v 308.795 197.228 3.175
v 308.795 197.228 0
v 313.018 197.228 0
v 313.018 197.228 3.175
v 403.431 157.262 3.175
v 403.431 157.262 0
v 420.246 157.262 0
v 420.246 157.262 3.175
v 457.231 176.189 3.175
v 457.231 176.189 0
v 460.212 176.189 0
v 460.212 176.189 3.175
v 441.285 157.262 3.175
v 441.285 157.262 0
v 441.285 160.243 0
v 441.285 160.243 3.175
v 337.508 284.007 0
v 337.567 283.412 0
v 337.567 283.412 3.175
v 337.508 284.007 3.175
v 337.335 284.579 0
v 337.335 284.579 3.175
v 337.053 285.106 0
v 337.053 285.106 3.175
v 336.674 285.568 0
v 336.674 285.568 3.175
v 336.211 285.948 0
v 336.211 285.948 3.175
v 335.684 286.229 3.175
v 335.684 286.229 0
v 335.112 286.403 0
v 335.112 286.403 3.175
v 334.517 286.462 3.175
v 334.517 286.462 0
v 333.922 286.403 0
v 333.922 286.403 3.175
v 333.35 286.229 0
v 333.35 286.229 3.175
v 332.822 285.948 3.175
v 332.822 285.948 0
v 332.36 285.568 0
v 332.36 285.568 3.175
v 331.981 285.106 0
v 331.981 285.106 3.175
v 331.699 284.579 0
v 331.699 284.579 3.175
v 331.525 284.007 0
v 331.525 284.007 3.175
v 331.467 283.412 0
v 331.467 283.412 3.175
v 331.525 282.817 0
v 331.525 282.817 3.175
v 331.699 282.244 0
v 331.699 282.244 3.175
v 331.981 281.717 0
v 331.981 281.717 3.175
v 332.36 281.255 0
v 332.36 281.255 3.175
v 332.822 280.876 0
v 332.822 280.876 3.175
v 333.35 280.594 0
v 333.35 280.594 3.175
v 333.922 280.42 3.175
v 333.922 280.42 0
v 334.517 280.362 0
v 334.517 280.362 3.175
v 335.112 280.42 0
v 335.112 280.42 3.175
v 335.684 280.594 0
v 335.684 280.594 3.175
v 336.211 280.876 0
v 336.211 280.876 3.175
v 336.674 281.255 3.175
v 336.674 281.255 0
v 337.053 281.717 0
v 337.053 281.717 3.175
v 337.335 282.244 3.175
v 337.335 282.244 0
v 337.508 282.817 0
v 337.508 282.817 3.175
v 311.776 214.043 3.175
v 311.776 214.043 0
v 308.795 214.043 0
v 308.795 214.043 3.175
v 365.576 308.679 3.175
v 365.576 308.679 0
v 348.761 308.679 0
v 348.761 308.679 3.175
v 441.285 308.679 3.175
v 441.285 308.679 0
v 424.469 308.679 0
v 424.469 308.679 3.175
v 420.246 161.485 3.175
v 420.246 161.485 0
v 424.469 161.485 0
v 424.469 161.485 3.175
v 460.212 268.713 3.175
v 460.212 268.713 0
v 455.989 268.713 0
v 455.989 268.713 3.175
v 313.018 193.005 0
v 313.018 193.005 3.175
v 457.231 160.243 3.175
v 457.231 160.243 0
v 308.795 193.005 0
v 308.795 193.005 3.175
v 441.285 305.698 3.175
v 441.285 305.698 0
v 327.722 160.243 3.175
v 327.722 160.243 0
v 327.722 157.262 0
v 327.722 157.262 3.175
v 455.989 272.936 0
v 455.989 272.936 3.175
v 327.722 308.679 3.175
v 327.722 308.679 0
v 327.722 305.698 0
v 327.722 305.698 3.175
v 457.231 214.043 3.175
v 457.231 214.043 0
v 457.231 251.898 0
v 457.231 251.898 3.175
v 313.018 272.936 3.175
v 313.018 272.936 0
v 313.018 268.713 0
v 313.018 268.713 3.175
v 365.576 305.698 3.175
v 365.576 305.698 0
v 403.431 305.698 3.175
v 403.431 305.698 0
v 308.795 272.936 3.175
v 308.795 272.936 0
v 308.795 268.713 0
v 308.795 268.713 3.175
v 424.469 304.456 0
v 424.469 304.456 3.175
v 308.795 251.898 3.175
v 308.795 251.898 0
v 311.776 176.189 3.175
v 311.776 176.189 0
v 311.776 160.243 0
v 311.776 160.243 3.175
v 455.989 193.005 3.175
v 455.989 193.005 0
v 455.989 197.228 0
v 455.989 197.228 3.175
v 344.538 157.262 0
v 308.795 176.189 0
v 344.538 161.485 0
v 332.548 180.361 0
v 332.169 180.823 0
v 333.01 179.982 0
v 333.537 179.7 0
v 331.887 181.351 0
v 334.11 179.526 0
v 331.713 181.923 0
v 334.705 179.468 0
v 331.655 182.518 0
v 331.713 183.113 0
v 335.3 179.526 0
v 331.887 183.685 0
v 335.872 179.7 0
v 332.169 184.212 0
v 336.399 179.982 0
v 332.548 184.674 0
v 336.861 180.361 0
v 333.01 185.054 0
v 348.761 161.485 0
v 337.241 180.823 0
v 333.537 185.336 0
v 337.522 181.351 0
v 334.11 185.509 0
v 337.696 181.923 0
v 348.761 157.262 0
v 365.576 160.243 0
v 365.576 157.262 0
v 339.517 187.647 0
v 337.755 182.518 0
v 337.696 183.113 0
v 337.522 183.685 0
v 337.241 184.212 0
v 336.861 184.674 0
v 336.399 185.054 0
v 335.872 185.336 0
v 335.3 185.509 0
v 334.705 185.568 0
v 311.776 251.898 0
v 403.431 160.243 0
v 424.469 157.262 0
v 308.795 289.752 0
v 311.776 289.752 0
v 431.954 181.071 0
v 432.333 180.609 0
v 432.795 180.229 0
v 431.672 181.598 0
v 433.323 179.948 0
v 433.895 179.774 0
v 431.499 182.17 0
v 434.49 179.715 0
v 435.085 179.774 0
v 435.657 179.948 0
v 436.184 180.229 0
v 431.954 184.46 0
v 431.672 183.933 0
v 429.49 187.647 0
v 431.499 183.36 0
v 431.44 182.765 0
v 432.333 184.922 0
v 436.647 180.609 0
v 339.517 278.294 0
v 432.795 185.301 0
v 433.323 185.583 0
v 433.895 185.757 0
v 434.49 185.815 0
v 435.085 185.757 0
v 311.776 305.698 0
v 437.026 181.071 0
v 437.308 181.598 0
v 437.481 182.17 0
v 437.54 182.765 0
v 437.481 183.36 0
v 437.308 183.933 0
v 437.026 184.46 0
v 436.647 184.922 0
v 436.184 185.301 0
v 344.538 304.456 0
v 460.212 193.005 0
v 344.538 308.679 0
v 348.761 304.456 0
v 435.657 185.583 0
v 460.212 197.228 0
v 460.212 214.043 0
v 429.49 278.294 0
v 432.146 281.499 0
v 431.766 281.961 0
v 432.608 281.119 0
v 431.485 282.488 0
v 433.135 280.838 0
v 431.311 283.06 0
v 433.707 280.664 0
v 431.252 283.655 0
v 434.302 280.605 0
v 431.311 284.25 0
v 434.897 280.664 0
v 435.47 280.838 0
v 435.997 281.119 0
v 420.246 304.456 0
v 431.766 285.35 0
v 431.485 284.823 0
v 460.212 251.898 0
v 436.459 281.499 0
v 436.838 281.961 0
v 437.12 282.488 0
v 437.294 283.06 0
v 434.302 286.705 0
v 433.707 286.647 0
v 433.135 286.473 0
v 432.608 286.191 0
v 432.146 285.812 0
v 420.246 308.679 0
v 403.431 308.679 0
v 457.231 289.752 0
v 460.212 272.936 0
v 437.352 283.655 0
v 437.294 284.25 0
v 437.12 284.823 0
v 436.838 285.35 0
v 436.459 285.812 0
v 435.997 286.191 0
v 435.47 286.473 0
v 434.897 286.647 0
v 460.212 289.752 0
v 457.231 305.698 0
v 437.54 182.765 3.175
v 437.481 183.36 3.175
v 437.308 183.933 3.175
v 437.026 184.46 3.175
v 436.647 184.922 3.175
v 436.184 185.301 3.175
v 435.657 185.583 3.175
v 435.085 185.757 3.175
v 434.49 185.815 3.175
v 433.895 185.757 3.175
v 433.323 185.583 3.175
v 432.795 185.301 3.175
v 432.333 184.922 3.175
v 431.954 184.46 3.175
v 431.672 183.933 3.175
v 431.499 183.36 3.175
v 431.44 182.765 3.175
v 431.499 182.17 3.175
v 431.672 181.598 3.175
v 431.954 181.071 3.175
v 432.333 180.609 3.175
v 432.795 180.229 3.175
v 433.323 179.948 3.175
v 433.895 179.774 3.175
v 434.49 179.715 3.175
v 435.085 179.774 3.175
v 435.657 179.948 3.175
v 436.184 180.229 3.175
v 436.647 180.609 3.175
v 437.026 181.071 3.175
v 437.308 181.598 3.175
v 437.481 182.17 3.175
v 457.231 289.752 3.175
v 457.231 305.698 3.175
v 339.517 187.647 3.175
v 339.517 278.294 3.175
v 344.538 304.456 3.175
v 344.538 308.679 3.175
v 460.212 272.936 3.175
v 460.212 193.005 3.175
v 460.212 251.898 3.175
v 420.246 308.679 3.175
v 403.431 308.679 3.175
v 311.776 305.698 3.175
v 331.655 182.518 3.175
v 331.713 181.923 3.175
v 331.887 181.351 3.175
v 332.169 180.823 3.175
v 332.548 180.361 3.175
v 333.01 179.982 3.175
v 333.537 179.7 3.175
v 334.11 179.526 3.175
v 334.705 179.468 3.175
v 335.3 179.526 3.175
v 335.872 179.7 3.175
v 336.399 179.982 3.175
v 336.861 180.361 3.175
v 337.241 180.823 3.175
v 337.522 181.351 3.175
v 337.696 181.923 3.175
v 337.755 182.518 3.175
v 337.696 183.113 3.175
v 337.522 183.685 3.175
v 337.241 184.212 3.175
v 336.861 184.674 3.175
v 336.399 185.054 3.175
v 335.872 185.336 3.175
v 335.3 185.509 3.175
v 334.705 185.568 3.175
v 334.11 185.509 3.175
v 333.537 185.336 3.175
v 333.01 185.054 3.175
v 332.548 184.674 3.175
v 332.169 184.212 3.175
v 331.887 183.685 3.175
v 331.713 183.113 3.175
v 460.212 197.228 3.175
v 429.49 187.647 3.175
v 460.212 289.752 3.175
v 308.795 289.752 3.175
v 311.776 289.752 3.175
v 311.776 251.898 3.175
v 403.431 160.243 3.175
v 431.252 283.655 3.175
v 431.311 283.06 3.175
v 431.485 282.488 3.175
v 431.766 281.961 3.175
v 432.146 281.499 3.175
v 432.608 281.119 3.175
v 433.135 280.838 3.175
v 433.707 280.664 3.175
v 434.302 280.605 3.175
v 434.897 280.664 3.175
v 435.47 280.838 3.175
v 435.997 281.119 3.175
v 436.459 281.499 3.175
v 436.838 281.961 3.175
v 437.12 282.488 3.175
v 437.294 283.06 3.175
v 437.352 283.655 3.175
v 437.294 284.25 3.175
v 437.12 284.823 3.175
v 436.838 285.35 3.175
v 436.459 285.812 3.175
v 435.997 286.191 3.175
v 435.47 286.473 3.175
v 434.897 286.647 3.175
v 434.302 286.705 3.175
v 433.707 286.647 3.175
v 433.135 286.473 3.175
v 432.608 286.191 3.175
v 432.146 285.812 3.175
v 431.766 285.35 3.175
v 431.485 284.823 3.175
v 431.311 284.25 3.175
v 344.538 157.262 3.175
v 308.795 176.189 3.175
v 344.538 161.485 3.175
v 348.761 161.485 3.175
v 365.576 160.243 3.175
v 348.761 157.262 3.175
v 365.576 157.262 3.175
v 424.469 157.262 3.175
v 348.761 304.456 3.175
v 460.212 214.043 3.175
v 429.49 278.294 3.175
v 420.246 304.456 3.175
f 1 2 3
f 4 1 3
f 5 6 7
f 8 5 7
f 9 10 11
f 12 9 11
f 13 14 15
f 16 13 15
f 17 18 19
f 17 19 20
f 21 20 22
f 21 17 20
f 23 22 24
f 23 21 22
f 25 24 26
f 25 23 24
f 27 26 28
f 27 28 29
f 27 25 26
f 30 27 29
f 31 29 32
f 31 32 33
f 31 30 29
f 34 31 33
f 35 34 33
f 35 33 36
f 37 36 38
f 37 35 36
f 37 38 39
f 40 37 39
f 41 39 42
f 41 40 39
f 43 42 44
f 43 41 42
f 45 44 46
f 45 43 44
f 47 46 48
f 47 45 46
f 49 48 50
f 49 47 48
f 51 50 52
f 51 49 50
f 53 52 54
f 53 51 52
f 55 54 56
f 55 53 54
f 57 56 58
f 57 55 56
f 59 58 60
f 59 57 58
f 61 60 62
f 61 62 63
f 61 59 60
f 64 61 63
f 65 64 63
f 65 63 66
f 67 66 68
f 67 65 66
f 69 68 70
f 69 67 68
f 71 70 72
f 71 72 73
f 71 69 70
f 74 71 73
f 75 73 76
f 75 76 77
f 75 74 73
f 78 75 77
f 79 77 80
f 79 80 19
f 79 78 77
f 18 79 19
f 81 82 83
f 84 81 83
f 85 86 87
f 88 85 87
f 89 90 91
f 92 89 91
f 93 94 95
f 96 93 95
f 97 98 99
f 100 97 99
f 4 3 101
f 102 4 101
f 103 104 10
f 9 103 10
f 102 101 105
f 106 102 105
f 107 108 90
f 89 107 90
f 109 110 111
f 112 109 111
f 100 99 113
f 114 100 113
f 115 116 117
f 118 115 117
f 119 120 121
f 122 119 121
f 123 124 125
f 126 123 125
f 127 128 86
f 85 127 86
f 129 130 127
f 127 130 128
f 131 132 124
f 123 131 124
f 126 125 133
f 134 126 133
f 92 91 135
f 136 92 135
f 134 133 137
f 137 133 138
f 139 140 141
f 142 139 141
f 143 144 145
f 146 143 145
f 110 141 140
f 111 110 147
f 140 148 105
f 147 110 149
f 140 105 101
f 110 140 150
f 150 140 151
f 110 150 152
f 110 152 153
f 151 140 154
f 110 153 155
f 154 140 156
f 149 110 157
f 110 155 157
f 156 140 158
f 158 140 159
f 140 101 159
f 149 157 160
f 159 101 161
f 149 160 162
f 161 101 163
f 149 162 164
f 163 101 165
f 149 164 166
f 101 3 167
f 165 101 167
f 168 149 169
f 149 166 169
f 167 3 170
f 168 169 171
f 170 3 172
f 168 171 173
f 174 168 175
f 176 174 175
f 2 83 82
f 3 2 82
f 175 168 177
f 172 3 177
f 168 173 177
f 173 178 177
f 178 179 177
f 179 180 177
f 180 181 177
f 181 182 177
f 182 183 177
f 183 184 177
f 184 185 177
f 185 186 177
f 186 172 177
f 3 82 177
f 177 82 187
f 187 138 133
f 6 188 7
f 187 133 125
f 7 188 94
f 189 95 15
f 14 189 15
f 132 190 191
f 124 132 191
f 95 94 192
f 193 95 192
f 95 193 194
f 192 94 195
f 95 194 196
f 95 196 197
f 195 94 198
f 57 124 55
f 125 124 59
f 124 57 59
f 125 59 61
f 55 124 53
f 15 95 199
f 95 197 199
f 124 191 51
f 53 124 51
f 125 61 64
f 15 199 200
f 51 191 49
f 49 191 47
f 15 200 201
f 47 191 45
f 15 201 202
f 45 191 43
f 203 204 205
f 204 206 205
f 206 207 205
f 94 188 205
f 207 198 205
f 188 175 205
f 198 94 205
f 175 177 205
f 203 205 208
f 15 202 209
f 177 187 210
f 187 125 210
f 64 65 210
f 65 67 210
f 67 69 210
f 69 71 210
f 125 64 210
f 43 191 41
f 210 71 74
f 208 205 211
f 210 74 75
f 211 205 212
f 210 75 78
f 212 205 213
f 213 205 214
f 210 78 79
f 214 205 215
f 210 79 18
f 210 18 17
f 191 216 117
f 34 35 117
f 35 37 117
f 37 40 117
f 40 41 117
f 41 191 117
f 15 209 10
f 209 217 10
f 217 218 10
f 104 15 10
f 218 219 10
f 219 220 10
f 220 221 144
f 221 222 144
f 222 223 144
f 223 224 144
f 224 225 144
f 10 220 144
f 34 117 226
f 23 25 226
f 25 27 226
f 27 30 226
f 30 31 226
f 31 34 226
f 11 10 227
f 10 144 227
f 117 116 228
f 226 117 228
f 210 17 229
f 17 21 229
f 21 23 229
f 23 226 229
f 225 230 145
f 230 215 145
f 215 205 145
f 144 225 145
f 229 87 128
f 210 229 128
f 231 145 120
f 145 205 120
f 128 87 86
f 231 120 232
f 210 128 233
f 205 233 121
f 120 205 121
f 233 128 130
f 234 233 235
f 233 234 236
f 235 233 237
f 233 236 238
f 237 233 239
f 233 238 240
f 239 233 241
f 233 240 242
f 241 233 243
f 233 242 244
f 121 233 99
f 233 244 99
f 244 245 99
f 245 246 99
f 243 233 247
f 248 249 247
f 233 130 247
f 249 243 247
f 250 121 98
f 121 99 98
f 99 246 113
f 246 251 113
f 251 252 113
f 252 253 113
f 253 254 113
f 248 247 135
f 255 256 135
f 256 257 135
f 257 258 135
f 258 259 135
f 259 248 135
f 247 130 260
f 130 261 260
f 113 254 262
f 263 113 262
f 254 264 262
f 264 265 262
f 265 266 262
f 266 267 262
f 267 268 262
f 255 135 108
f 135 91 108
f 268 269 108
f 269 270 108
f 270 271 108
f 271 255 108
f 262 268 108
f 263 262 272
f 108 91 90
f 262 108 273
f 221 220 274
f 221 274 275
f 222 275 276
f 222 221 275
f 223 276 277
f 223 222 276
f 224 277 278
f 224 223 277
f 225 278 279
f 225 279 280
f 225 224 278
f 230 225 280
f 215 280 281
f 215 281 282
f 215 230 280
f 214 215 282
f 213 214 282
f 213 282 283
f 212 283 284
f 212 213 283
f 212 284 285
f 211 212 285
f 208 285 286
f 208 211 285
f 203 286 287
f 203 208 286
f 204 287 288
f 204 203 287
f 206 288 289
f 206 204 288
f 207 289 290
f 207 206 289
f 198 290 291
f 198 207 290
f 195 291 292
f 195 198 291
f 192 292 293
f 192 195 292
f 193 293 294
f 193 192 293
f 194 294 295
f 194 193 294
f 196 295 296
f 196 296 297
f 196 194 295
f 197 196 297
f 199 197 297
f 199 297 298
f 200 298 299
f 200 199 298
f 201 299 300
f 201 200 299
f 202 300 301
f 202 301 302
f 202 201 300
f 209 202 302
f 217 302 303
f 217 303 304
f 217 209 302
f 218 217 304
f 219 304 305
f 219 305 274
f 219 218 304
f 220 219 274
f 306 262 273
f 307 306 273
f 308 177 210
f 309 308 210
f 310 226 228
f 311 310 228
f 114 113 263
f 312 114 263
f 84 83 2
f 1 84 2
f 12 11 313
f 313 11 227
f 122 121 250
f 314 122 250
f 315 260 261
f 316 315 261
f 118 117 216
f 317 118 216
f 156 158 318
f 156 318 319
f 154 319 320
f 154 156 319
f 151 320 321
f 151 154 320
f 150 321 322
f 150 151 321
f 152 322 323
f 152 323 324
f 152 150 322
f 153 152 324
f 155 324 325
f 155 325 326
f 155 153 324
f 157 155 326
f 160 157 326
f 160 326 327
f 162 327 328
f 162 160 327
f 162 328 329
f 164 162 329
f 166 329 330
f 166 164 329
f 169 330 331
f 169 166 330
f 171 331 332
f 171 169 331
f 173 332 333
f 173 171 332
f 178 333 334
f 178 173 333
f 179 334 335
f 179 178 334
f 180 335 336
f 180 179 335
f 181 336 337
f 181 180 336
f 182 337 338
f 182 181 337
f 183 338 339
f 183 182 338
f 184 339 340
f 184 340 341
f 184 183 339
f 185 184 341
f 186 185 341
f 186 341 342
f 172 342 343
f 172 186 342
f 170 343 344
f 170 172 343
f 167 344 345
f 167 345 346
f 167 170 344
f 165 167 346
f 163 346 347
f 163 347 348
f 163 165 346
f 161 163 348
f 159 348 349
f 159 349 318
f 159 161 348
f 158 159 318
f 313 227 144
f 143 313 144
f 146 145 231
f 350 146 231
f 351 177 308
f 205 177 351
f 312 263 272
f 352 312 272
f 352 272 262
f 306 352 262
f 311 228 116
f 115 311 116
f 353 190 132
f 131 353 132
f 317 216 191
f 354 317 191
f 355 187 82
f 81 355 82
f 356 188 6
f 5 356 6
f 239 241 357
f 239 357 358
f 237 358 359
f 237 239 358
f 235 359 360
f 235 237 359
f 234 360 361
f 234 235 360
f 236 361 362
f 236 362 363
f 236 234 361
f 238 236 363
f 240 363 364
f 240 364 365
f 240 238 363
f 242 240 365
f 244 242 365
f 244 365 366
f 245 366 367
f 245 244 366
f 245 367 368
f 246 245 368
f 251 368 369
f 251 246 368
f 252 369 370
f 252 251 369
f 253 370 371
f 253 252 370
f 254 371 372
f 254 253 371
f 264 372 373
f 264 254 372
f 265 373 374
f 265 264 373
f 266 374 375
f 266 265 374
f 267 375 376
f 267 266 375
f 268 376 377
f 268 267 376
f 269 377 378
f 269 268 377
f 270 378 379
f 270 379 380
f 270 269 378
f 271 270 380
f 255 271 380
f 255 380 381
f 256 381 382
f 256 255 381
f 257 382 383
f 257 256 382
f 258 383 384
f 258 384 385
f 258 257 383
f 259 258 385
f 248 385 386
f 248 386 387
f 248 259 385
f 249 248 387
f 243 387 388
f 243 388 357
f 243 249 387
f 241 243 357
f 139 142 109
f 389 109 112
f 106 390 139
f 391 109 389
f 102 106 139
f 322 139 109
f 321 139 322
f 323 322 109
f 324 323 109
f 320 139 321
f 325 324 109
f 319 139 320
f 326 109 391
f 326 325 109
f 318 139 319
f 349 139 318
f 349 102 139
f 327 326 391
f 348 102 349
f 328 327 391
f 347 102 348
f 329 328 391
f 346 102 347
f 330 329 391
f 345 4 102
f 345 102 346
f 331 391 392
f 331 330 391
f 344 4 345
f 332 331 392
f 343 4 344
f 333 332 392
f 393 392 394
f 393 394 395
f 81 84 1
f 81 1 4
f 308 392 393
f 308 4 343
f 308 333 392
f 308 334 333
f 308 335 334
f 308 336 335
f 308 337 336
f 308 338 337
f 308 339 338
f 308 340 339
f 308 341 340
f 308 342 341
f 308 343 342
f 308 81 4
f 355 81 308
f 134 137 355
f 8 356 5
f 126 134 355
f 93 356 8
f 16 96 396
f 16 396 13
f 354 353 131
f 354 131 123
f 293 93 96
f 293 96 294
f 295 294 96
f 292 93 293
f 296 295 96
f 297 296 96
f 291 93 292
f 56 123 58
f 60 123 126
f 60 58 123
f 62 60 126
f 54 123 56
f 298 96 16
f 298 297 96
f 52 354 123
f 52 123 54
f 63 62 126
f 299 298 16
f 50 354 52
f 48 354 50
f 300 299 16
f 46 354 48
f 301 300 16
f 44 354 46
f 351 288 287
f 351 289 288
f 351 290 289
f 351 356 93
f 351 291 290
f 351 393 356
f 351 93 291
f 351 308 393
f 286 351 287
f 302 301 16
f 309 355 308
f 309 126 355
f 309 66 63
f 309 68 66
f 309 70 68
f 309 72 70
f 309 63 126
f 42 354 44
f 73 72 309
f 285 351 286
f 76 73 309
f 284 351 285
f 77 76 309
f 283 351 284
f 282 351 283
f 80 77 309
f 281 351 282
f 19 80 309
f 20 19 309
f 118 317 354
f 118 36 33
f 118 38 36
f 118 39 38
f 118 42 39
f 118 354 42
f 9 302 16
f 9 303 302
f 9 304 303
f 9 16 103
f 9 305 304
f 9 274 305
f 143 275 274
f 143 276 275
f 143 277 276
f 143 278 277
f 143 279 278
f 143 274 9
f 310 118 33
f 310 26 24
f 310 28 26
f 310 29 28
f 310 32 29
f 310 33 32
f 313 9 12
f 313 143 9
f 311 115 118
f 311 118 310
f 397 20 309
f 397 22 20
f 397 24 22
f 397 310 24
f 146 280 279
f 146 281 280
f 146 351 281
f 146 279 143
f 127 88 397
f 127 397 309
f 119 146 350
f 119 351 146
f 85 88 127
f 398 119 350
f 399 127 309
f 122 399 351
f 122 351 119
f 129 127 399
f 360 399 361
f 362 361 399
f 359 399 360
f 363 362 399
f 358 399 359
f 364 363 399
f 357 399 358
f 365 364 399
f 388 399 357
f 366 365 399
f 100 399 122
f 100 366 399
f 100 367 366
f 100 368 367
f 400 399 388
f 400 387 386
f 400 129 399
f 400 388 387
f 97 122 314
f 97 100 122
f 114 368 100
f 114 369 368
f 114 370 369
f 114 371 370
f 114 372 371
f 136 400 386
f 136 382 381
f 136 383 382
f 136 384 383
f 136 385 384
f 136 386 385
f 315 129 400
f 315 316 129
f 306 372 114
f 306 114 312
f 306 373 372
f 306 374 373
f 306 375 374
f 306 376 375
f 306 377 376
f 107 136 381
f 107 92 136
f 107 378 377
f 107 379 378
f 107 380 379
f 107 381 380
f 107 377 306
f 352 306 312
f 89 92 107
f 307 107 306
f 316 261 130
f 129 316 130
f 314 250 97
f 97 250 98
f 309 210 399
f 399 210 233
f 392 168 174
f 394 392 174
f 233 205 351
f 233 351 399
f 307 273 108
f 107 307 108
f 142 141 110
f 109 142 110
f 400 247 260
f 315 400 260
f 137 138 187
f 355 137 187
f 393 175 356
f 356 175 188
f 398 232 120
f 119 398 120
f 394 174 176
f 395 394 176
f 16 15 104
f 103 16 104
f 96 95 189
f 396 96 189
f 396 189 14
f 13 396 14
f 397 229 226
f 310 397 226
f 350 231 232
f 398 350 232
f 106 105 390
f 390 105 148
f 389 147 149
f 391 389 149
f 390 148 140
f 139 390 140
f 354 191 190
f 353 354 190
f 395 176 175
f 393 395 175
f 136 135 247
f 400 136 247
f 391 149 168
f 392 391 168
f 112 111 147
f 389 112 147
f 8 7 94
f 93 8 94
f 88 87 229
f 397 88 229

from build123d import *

# Parameters (mm, degrees)
SKETCH1_R           = 3.05
SKETCH1_W           = 89.973098965
SKETCH1_H           = 90.646237782
BOSS_EXTRUDE1_DEPTH = 3.175


with BuildPart() as part:
    # Sketch1 → Boss-Extrude1 (new body)
    with BuildSketch(Plane.XY):
        Polygon((311.775650515, 305.698342824), (311.775650515, 289.751882688), (308.79500376, 289.751882688), (308.79500376, 272.936067248), (313.017586662, 272.936067248), (313.017586662, 270.824775797), (313.017586662, 268.713484346), (308.79500376, 268.713484346), (308.79500376, 251.897668907), (311.775650515, 251.897668907), (311.775650515, 214.043455125), (308.79500376, 214.043455125), (308.79500376, 197.227639686), (313.017586662, 197.227639686), (313.017586662, 195.116348235), (313.017586662, 193.005056783), (308.79500376, 193.005056783), (308.79500376, 176.189241344), (311.775650515, 176.189241344), (311.775650515, 160.242781208), (327.722110651, 160.242781208), (327.722110651, 157.262134453), (344.53792609, 157.262134453), (344.53792609, 161.484717355), (346.649217542, 161.484717355), (348.760508993, 161.484717355), (348.760508993, 157.262134453), (365.576324432, 157.262134453), (365.576324432, 160.242781208), (403.430538214, 160.242781208), (403.430538214, 157.262134453), (420.246353653, 157.262134453), (420.246353653, 161.484717355), (422.357645104, 161.484717355), (424.468936555, 161.484717355), (424.468936555, 157.262134453), (441.284751995, 157.262134453), (441.284751995, 160.242781208), (457.231212131, 160.242781208), (457.231212131, 176.189241344), (460.211858886, 176.189241344), (460.211858886, 193.005056783), (455.989275984, 193.005056783), (455.989275984, 195.116348235), (455.989275984, 197.227639686), (460.211858886, 197.227639686), (460.211858886, 214.043455125), (457.231212131, 214.043455125), (457.231212131, 251.897668907), (460.211858886, 251.897668907), (460.211858886, 268.713484346), (455.989275984, 268.713484346), (455.989275984, 270.824775797), (455.989275984, 272.936067248), (460.211858886, 272.936067248), (460.211858886, 289.751882688), (457.231212131, 289.751882688), (457.231212131, 305.698342824), (441.284751995, 305.698342824), (441.284751995, 308.678989579), (424.468936555, 308.678989579), (424.468936555, 304.456406677), (422.357645104, 304.456406677), (420.246353653, 304.456406677), (420.246353653, 308.678989579), (403.430538214, 308.678989579), (403.430538214, 305.698342824), (365.576324432, 305.698342824), (365.576324432, 308.678989579), (348.760508993, 308.678989579), (348.760508993, 304.456406677), (346.649217542, 304.456406677), (344.53792609, 304.456406677), (344.53792609, 308.678989579), (327.722110651, 308.678989579), (327.722110651, 305.698342824), align=None)
        with Locations((334.51688184, 283.411573885)):
            Circle(SKETCH1_R, mode=Mode.SUBTRACT)
        with Locations(Location((434.302437265, 283.655336103, 0), (0, 0, 180))):
            Circle(SKETCH1_R, mode=Mode.SUBTRACT)
        with Locations((434.489980805, 182.765336103)):
            Circle(SKETCH1_R, mode=Mode.SUBTRACT)
        with Locations(Location((334.704655446, 182.517816292, 0), (0, 0, 180))):
            Circle(SKETCH1_R, mode=Mode.SUBTRACT)
        with Locations((384.503431322, 232.970562016)):
            Rectangle(SKETCH1_W, SKETCH1_H, mode=Mode.SUBTRACT)
    extrude(amount=BOSS_EXTRUDE1_DEPTH)


solid = part.part
